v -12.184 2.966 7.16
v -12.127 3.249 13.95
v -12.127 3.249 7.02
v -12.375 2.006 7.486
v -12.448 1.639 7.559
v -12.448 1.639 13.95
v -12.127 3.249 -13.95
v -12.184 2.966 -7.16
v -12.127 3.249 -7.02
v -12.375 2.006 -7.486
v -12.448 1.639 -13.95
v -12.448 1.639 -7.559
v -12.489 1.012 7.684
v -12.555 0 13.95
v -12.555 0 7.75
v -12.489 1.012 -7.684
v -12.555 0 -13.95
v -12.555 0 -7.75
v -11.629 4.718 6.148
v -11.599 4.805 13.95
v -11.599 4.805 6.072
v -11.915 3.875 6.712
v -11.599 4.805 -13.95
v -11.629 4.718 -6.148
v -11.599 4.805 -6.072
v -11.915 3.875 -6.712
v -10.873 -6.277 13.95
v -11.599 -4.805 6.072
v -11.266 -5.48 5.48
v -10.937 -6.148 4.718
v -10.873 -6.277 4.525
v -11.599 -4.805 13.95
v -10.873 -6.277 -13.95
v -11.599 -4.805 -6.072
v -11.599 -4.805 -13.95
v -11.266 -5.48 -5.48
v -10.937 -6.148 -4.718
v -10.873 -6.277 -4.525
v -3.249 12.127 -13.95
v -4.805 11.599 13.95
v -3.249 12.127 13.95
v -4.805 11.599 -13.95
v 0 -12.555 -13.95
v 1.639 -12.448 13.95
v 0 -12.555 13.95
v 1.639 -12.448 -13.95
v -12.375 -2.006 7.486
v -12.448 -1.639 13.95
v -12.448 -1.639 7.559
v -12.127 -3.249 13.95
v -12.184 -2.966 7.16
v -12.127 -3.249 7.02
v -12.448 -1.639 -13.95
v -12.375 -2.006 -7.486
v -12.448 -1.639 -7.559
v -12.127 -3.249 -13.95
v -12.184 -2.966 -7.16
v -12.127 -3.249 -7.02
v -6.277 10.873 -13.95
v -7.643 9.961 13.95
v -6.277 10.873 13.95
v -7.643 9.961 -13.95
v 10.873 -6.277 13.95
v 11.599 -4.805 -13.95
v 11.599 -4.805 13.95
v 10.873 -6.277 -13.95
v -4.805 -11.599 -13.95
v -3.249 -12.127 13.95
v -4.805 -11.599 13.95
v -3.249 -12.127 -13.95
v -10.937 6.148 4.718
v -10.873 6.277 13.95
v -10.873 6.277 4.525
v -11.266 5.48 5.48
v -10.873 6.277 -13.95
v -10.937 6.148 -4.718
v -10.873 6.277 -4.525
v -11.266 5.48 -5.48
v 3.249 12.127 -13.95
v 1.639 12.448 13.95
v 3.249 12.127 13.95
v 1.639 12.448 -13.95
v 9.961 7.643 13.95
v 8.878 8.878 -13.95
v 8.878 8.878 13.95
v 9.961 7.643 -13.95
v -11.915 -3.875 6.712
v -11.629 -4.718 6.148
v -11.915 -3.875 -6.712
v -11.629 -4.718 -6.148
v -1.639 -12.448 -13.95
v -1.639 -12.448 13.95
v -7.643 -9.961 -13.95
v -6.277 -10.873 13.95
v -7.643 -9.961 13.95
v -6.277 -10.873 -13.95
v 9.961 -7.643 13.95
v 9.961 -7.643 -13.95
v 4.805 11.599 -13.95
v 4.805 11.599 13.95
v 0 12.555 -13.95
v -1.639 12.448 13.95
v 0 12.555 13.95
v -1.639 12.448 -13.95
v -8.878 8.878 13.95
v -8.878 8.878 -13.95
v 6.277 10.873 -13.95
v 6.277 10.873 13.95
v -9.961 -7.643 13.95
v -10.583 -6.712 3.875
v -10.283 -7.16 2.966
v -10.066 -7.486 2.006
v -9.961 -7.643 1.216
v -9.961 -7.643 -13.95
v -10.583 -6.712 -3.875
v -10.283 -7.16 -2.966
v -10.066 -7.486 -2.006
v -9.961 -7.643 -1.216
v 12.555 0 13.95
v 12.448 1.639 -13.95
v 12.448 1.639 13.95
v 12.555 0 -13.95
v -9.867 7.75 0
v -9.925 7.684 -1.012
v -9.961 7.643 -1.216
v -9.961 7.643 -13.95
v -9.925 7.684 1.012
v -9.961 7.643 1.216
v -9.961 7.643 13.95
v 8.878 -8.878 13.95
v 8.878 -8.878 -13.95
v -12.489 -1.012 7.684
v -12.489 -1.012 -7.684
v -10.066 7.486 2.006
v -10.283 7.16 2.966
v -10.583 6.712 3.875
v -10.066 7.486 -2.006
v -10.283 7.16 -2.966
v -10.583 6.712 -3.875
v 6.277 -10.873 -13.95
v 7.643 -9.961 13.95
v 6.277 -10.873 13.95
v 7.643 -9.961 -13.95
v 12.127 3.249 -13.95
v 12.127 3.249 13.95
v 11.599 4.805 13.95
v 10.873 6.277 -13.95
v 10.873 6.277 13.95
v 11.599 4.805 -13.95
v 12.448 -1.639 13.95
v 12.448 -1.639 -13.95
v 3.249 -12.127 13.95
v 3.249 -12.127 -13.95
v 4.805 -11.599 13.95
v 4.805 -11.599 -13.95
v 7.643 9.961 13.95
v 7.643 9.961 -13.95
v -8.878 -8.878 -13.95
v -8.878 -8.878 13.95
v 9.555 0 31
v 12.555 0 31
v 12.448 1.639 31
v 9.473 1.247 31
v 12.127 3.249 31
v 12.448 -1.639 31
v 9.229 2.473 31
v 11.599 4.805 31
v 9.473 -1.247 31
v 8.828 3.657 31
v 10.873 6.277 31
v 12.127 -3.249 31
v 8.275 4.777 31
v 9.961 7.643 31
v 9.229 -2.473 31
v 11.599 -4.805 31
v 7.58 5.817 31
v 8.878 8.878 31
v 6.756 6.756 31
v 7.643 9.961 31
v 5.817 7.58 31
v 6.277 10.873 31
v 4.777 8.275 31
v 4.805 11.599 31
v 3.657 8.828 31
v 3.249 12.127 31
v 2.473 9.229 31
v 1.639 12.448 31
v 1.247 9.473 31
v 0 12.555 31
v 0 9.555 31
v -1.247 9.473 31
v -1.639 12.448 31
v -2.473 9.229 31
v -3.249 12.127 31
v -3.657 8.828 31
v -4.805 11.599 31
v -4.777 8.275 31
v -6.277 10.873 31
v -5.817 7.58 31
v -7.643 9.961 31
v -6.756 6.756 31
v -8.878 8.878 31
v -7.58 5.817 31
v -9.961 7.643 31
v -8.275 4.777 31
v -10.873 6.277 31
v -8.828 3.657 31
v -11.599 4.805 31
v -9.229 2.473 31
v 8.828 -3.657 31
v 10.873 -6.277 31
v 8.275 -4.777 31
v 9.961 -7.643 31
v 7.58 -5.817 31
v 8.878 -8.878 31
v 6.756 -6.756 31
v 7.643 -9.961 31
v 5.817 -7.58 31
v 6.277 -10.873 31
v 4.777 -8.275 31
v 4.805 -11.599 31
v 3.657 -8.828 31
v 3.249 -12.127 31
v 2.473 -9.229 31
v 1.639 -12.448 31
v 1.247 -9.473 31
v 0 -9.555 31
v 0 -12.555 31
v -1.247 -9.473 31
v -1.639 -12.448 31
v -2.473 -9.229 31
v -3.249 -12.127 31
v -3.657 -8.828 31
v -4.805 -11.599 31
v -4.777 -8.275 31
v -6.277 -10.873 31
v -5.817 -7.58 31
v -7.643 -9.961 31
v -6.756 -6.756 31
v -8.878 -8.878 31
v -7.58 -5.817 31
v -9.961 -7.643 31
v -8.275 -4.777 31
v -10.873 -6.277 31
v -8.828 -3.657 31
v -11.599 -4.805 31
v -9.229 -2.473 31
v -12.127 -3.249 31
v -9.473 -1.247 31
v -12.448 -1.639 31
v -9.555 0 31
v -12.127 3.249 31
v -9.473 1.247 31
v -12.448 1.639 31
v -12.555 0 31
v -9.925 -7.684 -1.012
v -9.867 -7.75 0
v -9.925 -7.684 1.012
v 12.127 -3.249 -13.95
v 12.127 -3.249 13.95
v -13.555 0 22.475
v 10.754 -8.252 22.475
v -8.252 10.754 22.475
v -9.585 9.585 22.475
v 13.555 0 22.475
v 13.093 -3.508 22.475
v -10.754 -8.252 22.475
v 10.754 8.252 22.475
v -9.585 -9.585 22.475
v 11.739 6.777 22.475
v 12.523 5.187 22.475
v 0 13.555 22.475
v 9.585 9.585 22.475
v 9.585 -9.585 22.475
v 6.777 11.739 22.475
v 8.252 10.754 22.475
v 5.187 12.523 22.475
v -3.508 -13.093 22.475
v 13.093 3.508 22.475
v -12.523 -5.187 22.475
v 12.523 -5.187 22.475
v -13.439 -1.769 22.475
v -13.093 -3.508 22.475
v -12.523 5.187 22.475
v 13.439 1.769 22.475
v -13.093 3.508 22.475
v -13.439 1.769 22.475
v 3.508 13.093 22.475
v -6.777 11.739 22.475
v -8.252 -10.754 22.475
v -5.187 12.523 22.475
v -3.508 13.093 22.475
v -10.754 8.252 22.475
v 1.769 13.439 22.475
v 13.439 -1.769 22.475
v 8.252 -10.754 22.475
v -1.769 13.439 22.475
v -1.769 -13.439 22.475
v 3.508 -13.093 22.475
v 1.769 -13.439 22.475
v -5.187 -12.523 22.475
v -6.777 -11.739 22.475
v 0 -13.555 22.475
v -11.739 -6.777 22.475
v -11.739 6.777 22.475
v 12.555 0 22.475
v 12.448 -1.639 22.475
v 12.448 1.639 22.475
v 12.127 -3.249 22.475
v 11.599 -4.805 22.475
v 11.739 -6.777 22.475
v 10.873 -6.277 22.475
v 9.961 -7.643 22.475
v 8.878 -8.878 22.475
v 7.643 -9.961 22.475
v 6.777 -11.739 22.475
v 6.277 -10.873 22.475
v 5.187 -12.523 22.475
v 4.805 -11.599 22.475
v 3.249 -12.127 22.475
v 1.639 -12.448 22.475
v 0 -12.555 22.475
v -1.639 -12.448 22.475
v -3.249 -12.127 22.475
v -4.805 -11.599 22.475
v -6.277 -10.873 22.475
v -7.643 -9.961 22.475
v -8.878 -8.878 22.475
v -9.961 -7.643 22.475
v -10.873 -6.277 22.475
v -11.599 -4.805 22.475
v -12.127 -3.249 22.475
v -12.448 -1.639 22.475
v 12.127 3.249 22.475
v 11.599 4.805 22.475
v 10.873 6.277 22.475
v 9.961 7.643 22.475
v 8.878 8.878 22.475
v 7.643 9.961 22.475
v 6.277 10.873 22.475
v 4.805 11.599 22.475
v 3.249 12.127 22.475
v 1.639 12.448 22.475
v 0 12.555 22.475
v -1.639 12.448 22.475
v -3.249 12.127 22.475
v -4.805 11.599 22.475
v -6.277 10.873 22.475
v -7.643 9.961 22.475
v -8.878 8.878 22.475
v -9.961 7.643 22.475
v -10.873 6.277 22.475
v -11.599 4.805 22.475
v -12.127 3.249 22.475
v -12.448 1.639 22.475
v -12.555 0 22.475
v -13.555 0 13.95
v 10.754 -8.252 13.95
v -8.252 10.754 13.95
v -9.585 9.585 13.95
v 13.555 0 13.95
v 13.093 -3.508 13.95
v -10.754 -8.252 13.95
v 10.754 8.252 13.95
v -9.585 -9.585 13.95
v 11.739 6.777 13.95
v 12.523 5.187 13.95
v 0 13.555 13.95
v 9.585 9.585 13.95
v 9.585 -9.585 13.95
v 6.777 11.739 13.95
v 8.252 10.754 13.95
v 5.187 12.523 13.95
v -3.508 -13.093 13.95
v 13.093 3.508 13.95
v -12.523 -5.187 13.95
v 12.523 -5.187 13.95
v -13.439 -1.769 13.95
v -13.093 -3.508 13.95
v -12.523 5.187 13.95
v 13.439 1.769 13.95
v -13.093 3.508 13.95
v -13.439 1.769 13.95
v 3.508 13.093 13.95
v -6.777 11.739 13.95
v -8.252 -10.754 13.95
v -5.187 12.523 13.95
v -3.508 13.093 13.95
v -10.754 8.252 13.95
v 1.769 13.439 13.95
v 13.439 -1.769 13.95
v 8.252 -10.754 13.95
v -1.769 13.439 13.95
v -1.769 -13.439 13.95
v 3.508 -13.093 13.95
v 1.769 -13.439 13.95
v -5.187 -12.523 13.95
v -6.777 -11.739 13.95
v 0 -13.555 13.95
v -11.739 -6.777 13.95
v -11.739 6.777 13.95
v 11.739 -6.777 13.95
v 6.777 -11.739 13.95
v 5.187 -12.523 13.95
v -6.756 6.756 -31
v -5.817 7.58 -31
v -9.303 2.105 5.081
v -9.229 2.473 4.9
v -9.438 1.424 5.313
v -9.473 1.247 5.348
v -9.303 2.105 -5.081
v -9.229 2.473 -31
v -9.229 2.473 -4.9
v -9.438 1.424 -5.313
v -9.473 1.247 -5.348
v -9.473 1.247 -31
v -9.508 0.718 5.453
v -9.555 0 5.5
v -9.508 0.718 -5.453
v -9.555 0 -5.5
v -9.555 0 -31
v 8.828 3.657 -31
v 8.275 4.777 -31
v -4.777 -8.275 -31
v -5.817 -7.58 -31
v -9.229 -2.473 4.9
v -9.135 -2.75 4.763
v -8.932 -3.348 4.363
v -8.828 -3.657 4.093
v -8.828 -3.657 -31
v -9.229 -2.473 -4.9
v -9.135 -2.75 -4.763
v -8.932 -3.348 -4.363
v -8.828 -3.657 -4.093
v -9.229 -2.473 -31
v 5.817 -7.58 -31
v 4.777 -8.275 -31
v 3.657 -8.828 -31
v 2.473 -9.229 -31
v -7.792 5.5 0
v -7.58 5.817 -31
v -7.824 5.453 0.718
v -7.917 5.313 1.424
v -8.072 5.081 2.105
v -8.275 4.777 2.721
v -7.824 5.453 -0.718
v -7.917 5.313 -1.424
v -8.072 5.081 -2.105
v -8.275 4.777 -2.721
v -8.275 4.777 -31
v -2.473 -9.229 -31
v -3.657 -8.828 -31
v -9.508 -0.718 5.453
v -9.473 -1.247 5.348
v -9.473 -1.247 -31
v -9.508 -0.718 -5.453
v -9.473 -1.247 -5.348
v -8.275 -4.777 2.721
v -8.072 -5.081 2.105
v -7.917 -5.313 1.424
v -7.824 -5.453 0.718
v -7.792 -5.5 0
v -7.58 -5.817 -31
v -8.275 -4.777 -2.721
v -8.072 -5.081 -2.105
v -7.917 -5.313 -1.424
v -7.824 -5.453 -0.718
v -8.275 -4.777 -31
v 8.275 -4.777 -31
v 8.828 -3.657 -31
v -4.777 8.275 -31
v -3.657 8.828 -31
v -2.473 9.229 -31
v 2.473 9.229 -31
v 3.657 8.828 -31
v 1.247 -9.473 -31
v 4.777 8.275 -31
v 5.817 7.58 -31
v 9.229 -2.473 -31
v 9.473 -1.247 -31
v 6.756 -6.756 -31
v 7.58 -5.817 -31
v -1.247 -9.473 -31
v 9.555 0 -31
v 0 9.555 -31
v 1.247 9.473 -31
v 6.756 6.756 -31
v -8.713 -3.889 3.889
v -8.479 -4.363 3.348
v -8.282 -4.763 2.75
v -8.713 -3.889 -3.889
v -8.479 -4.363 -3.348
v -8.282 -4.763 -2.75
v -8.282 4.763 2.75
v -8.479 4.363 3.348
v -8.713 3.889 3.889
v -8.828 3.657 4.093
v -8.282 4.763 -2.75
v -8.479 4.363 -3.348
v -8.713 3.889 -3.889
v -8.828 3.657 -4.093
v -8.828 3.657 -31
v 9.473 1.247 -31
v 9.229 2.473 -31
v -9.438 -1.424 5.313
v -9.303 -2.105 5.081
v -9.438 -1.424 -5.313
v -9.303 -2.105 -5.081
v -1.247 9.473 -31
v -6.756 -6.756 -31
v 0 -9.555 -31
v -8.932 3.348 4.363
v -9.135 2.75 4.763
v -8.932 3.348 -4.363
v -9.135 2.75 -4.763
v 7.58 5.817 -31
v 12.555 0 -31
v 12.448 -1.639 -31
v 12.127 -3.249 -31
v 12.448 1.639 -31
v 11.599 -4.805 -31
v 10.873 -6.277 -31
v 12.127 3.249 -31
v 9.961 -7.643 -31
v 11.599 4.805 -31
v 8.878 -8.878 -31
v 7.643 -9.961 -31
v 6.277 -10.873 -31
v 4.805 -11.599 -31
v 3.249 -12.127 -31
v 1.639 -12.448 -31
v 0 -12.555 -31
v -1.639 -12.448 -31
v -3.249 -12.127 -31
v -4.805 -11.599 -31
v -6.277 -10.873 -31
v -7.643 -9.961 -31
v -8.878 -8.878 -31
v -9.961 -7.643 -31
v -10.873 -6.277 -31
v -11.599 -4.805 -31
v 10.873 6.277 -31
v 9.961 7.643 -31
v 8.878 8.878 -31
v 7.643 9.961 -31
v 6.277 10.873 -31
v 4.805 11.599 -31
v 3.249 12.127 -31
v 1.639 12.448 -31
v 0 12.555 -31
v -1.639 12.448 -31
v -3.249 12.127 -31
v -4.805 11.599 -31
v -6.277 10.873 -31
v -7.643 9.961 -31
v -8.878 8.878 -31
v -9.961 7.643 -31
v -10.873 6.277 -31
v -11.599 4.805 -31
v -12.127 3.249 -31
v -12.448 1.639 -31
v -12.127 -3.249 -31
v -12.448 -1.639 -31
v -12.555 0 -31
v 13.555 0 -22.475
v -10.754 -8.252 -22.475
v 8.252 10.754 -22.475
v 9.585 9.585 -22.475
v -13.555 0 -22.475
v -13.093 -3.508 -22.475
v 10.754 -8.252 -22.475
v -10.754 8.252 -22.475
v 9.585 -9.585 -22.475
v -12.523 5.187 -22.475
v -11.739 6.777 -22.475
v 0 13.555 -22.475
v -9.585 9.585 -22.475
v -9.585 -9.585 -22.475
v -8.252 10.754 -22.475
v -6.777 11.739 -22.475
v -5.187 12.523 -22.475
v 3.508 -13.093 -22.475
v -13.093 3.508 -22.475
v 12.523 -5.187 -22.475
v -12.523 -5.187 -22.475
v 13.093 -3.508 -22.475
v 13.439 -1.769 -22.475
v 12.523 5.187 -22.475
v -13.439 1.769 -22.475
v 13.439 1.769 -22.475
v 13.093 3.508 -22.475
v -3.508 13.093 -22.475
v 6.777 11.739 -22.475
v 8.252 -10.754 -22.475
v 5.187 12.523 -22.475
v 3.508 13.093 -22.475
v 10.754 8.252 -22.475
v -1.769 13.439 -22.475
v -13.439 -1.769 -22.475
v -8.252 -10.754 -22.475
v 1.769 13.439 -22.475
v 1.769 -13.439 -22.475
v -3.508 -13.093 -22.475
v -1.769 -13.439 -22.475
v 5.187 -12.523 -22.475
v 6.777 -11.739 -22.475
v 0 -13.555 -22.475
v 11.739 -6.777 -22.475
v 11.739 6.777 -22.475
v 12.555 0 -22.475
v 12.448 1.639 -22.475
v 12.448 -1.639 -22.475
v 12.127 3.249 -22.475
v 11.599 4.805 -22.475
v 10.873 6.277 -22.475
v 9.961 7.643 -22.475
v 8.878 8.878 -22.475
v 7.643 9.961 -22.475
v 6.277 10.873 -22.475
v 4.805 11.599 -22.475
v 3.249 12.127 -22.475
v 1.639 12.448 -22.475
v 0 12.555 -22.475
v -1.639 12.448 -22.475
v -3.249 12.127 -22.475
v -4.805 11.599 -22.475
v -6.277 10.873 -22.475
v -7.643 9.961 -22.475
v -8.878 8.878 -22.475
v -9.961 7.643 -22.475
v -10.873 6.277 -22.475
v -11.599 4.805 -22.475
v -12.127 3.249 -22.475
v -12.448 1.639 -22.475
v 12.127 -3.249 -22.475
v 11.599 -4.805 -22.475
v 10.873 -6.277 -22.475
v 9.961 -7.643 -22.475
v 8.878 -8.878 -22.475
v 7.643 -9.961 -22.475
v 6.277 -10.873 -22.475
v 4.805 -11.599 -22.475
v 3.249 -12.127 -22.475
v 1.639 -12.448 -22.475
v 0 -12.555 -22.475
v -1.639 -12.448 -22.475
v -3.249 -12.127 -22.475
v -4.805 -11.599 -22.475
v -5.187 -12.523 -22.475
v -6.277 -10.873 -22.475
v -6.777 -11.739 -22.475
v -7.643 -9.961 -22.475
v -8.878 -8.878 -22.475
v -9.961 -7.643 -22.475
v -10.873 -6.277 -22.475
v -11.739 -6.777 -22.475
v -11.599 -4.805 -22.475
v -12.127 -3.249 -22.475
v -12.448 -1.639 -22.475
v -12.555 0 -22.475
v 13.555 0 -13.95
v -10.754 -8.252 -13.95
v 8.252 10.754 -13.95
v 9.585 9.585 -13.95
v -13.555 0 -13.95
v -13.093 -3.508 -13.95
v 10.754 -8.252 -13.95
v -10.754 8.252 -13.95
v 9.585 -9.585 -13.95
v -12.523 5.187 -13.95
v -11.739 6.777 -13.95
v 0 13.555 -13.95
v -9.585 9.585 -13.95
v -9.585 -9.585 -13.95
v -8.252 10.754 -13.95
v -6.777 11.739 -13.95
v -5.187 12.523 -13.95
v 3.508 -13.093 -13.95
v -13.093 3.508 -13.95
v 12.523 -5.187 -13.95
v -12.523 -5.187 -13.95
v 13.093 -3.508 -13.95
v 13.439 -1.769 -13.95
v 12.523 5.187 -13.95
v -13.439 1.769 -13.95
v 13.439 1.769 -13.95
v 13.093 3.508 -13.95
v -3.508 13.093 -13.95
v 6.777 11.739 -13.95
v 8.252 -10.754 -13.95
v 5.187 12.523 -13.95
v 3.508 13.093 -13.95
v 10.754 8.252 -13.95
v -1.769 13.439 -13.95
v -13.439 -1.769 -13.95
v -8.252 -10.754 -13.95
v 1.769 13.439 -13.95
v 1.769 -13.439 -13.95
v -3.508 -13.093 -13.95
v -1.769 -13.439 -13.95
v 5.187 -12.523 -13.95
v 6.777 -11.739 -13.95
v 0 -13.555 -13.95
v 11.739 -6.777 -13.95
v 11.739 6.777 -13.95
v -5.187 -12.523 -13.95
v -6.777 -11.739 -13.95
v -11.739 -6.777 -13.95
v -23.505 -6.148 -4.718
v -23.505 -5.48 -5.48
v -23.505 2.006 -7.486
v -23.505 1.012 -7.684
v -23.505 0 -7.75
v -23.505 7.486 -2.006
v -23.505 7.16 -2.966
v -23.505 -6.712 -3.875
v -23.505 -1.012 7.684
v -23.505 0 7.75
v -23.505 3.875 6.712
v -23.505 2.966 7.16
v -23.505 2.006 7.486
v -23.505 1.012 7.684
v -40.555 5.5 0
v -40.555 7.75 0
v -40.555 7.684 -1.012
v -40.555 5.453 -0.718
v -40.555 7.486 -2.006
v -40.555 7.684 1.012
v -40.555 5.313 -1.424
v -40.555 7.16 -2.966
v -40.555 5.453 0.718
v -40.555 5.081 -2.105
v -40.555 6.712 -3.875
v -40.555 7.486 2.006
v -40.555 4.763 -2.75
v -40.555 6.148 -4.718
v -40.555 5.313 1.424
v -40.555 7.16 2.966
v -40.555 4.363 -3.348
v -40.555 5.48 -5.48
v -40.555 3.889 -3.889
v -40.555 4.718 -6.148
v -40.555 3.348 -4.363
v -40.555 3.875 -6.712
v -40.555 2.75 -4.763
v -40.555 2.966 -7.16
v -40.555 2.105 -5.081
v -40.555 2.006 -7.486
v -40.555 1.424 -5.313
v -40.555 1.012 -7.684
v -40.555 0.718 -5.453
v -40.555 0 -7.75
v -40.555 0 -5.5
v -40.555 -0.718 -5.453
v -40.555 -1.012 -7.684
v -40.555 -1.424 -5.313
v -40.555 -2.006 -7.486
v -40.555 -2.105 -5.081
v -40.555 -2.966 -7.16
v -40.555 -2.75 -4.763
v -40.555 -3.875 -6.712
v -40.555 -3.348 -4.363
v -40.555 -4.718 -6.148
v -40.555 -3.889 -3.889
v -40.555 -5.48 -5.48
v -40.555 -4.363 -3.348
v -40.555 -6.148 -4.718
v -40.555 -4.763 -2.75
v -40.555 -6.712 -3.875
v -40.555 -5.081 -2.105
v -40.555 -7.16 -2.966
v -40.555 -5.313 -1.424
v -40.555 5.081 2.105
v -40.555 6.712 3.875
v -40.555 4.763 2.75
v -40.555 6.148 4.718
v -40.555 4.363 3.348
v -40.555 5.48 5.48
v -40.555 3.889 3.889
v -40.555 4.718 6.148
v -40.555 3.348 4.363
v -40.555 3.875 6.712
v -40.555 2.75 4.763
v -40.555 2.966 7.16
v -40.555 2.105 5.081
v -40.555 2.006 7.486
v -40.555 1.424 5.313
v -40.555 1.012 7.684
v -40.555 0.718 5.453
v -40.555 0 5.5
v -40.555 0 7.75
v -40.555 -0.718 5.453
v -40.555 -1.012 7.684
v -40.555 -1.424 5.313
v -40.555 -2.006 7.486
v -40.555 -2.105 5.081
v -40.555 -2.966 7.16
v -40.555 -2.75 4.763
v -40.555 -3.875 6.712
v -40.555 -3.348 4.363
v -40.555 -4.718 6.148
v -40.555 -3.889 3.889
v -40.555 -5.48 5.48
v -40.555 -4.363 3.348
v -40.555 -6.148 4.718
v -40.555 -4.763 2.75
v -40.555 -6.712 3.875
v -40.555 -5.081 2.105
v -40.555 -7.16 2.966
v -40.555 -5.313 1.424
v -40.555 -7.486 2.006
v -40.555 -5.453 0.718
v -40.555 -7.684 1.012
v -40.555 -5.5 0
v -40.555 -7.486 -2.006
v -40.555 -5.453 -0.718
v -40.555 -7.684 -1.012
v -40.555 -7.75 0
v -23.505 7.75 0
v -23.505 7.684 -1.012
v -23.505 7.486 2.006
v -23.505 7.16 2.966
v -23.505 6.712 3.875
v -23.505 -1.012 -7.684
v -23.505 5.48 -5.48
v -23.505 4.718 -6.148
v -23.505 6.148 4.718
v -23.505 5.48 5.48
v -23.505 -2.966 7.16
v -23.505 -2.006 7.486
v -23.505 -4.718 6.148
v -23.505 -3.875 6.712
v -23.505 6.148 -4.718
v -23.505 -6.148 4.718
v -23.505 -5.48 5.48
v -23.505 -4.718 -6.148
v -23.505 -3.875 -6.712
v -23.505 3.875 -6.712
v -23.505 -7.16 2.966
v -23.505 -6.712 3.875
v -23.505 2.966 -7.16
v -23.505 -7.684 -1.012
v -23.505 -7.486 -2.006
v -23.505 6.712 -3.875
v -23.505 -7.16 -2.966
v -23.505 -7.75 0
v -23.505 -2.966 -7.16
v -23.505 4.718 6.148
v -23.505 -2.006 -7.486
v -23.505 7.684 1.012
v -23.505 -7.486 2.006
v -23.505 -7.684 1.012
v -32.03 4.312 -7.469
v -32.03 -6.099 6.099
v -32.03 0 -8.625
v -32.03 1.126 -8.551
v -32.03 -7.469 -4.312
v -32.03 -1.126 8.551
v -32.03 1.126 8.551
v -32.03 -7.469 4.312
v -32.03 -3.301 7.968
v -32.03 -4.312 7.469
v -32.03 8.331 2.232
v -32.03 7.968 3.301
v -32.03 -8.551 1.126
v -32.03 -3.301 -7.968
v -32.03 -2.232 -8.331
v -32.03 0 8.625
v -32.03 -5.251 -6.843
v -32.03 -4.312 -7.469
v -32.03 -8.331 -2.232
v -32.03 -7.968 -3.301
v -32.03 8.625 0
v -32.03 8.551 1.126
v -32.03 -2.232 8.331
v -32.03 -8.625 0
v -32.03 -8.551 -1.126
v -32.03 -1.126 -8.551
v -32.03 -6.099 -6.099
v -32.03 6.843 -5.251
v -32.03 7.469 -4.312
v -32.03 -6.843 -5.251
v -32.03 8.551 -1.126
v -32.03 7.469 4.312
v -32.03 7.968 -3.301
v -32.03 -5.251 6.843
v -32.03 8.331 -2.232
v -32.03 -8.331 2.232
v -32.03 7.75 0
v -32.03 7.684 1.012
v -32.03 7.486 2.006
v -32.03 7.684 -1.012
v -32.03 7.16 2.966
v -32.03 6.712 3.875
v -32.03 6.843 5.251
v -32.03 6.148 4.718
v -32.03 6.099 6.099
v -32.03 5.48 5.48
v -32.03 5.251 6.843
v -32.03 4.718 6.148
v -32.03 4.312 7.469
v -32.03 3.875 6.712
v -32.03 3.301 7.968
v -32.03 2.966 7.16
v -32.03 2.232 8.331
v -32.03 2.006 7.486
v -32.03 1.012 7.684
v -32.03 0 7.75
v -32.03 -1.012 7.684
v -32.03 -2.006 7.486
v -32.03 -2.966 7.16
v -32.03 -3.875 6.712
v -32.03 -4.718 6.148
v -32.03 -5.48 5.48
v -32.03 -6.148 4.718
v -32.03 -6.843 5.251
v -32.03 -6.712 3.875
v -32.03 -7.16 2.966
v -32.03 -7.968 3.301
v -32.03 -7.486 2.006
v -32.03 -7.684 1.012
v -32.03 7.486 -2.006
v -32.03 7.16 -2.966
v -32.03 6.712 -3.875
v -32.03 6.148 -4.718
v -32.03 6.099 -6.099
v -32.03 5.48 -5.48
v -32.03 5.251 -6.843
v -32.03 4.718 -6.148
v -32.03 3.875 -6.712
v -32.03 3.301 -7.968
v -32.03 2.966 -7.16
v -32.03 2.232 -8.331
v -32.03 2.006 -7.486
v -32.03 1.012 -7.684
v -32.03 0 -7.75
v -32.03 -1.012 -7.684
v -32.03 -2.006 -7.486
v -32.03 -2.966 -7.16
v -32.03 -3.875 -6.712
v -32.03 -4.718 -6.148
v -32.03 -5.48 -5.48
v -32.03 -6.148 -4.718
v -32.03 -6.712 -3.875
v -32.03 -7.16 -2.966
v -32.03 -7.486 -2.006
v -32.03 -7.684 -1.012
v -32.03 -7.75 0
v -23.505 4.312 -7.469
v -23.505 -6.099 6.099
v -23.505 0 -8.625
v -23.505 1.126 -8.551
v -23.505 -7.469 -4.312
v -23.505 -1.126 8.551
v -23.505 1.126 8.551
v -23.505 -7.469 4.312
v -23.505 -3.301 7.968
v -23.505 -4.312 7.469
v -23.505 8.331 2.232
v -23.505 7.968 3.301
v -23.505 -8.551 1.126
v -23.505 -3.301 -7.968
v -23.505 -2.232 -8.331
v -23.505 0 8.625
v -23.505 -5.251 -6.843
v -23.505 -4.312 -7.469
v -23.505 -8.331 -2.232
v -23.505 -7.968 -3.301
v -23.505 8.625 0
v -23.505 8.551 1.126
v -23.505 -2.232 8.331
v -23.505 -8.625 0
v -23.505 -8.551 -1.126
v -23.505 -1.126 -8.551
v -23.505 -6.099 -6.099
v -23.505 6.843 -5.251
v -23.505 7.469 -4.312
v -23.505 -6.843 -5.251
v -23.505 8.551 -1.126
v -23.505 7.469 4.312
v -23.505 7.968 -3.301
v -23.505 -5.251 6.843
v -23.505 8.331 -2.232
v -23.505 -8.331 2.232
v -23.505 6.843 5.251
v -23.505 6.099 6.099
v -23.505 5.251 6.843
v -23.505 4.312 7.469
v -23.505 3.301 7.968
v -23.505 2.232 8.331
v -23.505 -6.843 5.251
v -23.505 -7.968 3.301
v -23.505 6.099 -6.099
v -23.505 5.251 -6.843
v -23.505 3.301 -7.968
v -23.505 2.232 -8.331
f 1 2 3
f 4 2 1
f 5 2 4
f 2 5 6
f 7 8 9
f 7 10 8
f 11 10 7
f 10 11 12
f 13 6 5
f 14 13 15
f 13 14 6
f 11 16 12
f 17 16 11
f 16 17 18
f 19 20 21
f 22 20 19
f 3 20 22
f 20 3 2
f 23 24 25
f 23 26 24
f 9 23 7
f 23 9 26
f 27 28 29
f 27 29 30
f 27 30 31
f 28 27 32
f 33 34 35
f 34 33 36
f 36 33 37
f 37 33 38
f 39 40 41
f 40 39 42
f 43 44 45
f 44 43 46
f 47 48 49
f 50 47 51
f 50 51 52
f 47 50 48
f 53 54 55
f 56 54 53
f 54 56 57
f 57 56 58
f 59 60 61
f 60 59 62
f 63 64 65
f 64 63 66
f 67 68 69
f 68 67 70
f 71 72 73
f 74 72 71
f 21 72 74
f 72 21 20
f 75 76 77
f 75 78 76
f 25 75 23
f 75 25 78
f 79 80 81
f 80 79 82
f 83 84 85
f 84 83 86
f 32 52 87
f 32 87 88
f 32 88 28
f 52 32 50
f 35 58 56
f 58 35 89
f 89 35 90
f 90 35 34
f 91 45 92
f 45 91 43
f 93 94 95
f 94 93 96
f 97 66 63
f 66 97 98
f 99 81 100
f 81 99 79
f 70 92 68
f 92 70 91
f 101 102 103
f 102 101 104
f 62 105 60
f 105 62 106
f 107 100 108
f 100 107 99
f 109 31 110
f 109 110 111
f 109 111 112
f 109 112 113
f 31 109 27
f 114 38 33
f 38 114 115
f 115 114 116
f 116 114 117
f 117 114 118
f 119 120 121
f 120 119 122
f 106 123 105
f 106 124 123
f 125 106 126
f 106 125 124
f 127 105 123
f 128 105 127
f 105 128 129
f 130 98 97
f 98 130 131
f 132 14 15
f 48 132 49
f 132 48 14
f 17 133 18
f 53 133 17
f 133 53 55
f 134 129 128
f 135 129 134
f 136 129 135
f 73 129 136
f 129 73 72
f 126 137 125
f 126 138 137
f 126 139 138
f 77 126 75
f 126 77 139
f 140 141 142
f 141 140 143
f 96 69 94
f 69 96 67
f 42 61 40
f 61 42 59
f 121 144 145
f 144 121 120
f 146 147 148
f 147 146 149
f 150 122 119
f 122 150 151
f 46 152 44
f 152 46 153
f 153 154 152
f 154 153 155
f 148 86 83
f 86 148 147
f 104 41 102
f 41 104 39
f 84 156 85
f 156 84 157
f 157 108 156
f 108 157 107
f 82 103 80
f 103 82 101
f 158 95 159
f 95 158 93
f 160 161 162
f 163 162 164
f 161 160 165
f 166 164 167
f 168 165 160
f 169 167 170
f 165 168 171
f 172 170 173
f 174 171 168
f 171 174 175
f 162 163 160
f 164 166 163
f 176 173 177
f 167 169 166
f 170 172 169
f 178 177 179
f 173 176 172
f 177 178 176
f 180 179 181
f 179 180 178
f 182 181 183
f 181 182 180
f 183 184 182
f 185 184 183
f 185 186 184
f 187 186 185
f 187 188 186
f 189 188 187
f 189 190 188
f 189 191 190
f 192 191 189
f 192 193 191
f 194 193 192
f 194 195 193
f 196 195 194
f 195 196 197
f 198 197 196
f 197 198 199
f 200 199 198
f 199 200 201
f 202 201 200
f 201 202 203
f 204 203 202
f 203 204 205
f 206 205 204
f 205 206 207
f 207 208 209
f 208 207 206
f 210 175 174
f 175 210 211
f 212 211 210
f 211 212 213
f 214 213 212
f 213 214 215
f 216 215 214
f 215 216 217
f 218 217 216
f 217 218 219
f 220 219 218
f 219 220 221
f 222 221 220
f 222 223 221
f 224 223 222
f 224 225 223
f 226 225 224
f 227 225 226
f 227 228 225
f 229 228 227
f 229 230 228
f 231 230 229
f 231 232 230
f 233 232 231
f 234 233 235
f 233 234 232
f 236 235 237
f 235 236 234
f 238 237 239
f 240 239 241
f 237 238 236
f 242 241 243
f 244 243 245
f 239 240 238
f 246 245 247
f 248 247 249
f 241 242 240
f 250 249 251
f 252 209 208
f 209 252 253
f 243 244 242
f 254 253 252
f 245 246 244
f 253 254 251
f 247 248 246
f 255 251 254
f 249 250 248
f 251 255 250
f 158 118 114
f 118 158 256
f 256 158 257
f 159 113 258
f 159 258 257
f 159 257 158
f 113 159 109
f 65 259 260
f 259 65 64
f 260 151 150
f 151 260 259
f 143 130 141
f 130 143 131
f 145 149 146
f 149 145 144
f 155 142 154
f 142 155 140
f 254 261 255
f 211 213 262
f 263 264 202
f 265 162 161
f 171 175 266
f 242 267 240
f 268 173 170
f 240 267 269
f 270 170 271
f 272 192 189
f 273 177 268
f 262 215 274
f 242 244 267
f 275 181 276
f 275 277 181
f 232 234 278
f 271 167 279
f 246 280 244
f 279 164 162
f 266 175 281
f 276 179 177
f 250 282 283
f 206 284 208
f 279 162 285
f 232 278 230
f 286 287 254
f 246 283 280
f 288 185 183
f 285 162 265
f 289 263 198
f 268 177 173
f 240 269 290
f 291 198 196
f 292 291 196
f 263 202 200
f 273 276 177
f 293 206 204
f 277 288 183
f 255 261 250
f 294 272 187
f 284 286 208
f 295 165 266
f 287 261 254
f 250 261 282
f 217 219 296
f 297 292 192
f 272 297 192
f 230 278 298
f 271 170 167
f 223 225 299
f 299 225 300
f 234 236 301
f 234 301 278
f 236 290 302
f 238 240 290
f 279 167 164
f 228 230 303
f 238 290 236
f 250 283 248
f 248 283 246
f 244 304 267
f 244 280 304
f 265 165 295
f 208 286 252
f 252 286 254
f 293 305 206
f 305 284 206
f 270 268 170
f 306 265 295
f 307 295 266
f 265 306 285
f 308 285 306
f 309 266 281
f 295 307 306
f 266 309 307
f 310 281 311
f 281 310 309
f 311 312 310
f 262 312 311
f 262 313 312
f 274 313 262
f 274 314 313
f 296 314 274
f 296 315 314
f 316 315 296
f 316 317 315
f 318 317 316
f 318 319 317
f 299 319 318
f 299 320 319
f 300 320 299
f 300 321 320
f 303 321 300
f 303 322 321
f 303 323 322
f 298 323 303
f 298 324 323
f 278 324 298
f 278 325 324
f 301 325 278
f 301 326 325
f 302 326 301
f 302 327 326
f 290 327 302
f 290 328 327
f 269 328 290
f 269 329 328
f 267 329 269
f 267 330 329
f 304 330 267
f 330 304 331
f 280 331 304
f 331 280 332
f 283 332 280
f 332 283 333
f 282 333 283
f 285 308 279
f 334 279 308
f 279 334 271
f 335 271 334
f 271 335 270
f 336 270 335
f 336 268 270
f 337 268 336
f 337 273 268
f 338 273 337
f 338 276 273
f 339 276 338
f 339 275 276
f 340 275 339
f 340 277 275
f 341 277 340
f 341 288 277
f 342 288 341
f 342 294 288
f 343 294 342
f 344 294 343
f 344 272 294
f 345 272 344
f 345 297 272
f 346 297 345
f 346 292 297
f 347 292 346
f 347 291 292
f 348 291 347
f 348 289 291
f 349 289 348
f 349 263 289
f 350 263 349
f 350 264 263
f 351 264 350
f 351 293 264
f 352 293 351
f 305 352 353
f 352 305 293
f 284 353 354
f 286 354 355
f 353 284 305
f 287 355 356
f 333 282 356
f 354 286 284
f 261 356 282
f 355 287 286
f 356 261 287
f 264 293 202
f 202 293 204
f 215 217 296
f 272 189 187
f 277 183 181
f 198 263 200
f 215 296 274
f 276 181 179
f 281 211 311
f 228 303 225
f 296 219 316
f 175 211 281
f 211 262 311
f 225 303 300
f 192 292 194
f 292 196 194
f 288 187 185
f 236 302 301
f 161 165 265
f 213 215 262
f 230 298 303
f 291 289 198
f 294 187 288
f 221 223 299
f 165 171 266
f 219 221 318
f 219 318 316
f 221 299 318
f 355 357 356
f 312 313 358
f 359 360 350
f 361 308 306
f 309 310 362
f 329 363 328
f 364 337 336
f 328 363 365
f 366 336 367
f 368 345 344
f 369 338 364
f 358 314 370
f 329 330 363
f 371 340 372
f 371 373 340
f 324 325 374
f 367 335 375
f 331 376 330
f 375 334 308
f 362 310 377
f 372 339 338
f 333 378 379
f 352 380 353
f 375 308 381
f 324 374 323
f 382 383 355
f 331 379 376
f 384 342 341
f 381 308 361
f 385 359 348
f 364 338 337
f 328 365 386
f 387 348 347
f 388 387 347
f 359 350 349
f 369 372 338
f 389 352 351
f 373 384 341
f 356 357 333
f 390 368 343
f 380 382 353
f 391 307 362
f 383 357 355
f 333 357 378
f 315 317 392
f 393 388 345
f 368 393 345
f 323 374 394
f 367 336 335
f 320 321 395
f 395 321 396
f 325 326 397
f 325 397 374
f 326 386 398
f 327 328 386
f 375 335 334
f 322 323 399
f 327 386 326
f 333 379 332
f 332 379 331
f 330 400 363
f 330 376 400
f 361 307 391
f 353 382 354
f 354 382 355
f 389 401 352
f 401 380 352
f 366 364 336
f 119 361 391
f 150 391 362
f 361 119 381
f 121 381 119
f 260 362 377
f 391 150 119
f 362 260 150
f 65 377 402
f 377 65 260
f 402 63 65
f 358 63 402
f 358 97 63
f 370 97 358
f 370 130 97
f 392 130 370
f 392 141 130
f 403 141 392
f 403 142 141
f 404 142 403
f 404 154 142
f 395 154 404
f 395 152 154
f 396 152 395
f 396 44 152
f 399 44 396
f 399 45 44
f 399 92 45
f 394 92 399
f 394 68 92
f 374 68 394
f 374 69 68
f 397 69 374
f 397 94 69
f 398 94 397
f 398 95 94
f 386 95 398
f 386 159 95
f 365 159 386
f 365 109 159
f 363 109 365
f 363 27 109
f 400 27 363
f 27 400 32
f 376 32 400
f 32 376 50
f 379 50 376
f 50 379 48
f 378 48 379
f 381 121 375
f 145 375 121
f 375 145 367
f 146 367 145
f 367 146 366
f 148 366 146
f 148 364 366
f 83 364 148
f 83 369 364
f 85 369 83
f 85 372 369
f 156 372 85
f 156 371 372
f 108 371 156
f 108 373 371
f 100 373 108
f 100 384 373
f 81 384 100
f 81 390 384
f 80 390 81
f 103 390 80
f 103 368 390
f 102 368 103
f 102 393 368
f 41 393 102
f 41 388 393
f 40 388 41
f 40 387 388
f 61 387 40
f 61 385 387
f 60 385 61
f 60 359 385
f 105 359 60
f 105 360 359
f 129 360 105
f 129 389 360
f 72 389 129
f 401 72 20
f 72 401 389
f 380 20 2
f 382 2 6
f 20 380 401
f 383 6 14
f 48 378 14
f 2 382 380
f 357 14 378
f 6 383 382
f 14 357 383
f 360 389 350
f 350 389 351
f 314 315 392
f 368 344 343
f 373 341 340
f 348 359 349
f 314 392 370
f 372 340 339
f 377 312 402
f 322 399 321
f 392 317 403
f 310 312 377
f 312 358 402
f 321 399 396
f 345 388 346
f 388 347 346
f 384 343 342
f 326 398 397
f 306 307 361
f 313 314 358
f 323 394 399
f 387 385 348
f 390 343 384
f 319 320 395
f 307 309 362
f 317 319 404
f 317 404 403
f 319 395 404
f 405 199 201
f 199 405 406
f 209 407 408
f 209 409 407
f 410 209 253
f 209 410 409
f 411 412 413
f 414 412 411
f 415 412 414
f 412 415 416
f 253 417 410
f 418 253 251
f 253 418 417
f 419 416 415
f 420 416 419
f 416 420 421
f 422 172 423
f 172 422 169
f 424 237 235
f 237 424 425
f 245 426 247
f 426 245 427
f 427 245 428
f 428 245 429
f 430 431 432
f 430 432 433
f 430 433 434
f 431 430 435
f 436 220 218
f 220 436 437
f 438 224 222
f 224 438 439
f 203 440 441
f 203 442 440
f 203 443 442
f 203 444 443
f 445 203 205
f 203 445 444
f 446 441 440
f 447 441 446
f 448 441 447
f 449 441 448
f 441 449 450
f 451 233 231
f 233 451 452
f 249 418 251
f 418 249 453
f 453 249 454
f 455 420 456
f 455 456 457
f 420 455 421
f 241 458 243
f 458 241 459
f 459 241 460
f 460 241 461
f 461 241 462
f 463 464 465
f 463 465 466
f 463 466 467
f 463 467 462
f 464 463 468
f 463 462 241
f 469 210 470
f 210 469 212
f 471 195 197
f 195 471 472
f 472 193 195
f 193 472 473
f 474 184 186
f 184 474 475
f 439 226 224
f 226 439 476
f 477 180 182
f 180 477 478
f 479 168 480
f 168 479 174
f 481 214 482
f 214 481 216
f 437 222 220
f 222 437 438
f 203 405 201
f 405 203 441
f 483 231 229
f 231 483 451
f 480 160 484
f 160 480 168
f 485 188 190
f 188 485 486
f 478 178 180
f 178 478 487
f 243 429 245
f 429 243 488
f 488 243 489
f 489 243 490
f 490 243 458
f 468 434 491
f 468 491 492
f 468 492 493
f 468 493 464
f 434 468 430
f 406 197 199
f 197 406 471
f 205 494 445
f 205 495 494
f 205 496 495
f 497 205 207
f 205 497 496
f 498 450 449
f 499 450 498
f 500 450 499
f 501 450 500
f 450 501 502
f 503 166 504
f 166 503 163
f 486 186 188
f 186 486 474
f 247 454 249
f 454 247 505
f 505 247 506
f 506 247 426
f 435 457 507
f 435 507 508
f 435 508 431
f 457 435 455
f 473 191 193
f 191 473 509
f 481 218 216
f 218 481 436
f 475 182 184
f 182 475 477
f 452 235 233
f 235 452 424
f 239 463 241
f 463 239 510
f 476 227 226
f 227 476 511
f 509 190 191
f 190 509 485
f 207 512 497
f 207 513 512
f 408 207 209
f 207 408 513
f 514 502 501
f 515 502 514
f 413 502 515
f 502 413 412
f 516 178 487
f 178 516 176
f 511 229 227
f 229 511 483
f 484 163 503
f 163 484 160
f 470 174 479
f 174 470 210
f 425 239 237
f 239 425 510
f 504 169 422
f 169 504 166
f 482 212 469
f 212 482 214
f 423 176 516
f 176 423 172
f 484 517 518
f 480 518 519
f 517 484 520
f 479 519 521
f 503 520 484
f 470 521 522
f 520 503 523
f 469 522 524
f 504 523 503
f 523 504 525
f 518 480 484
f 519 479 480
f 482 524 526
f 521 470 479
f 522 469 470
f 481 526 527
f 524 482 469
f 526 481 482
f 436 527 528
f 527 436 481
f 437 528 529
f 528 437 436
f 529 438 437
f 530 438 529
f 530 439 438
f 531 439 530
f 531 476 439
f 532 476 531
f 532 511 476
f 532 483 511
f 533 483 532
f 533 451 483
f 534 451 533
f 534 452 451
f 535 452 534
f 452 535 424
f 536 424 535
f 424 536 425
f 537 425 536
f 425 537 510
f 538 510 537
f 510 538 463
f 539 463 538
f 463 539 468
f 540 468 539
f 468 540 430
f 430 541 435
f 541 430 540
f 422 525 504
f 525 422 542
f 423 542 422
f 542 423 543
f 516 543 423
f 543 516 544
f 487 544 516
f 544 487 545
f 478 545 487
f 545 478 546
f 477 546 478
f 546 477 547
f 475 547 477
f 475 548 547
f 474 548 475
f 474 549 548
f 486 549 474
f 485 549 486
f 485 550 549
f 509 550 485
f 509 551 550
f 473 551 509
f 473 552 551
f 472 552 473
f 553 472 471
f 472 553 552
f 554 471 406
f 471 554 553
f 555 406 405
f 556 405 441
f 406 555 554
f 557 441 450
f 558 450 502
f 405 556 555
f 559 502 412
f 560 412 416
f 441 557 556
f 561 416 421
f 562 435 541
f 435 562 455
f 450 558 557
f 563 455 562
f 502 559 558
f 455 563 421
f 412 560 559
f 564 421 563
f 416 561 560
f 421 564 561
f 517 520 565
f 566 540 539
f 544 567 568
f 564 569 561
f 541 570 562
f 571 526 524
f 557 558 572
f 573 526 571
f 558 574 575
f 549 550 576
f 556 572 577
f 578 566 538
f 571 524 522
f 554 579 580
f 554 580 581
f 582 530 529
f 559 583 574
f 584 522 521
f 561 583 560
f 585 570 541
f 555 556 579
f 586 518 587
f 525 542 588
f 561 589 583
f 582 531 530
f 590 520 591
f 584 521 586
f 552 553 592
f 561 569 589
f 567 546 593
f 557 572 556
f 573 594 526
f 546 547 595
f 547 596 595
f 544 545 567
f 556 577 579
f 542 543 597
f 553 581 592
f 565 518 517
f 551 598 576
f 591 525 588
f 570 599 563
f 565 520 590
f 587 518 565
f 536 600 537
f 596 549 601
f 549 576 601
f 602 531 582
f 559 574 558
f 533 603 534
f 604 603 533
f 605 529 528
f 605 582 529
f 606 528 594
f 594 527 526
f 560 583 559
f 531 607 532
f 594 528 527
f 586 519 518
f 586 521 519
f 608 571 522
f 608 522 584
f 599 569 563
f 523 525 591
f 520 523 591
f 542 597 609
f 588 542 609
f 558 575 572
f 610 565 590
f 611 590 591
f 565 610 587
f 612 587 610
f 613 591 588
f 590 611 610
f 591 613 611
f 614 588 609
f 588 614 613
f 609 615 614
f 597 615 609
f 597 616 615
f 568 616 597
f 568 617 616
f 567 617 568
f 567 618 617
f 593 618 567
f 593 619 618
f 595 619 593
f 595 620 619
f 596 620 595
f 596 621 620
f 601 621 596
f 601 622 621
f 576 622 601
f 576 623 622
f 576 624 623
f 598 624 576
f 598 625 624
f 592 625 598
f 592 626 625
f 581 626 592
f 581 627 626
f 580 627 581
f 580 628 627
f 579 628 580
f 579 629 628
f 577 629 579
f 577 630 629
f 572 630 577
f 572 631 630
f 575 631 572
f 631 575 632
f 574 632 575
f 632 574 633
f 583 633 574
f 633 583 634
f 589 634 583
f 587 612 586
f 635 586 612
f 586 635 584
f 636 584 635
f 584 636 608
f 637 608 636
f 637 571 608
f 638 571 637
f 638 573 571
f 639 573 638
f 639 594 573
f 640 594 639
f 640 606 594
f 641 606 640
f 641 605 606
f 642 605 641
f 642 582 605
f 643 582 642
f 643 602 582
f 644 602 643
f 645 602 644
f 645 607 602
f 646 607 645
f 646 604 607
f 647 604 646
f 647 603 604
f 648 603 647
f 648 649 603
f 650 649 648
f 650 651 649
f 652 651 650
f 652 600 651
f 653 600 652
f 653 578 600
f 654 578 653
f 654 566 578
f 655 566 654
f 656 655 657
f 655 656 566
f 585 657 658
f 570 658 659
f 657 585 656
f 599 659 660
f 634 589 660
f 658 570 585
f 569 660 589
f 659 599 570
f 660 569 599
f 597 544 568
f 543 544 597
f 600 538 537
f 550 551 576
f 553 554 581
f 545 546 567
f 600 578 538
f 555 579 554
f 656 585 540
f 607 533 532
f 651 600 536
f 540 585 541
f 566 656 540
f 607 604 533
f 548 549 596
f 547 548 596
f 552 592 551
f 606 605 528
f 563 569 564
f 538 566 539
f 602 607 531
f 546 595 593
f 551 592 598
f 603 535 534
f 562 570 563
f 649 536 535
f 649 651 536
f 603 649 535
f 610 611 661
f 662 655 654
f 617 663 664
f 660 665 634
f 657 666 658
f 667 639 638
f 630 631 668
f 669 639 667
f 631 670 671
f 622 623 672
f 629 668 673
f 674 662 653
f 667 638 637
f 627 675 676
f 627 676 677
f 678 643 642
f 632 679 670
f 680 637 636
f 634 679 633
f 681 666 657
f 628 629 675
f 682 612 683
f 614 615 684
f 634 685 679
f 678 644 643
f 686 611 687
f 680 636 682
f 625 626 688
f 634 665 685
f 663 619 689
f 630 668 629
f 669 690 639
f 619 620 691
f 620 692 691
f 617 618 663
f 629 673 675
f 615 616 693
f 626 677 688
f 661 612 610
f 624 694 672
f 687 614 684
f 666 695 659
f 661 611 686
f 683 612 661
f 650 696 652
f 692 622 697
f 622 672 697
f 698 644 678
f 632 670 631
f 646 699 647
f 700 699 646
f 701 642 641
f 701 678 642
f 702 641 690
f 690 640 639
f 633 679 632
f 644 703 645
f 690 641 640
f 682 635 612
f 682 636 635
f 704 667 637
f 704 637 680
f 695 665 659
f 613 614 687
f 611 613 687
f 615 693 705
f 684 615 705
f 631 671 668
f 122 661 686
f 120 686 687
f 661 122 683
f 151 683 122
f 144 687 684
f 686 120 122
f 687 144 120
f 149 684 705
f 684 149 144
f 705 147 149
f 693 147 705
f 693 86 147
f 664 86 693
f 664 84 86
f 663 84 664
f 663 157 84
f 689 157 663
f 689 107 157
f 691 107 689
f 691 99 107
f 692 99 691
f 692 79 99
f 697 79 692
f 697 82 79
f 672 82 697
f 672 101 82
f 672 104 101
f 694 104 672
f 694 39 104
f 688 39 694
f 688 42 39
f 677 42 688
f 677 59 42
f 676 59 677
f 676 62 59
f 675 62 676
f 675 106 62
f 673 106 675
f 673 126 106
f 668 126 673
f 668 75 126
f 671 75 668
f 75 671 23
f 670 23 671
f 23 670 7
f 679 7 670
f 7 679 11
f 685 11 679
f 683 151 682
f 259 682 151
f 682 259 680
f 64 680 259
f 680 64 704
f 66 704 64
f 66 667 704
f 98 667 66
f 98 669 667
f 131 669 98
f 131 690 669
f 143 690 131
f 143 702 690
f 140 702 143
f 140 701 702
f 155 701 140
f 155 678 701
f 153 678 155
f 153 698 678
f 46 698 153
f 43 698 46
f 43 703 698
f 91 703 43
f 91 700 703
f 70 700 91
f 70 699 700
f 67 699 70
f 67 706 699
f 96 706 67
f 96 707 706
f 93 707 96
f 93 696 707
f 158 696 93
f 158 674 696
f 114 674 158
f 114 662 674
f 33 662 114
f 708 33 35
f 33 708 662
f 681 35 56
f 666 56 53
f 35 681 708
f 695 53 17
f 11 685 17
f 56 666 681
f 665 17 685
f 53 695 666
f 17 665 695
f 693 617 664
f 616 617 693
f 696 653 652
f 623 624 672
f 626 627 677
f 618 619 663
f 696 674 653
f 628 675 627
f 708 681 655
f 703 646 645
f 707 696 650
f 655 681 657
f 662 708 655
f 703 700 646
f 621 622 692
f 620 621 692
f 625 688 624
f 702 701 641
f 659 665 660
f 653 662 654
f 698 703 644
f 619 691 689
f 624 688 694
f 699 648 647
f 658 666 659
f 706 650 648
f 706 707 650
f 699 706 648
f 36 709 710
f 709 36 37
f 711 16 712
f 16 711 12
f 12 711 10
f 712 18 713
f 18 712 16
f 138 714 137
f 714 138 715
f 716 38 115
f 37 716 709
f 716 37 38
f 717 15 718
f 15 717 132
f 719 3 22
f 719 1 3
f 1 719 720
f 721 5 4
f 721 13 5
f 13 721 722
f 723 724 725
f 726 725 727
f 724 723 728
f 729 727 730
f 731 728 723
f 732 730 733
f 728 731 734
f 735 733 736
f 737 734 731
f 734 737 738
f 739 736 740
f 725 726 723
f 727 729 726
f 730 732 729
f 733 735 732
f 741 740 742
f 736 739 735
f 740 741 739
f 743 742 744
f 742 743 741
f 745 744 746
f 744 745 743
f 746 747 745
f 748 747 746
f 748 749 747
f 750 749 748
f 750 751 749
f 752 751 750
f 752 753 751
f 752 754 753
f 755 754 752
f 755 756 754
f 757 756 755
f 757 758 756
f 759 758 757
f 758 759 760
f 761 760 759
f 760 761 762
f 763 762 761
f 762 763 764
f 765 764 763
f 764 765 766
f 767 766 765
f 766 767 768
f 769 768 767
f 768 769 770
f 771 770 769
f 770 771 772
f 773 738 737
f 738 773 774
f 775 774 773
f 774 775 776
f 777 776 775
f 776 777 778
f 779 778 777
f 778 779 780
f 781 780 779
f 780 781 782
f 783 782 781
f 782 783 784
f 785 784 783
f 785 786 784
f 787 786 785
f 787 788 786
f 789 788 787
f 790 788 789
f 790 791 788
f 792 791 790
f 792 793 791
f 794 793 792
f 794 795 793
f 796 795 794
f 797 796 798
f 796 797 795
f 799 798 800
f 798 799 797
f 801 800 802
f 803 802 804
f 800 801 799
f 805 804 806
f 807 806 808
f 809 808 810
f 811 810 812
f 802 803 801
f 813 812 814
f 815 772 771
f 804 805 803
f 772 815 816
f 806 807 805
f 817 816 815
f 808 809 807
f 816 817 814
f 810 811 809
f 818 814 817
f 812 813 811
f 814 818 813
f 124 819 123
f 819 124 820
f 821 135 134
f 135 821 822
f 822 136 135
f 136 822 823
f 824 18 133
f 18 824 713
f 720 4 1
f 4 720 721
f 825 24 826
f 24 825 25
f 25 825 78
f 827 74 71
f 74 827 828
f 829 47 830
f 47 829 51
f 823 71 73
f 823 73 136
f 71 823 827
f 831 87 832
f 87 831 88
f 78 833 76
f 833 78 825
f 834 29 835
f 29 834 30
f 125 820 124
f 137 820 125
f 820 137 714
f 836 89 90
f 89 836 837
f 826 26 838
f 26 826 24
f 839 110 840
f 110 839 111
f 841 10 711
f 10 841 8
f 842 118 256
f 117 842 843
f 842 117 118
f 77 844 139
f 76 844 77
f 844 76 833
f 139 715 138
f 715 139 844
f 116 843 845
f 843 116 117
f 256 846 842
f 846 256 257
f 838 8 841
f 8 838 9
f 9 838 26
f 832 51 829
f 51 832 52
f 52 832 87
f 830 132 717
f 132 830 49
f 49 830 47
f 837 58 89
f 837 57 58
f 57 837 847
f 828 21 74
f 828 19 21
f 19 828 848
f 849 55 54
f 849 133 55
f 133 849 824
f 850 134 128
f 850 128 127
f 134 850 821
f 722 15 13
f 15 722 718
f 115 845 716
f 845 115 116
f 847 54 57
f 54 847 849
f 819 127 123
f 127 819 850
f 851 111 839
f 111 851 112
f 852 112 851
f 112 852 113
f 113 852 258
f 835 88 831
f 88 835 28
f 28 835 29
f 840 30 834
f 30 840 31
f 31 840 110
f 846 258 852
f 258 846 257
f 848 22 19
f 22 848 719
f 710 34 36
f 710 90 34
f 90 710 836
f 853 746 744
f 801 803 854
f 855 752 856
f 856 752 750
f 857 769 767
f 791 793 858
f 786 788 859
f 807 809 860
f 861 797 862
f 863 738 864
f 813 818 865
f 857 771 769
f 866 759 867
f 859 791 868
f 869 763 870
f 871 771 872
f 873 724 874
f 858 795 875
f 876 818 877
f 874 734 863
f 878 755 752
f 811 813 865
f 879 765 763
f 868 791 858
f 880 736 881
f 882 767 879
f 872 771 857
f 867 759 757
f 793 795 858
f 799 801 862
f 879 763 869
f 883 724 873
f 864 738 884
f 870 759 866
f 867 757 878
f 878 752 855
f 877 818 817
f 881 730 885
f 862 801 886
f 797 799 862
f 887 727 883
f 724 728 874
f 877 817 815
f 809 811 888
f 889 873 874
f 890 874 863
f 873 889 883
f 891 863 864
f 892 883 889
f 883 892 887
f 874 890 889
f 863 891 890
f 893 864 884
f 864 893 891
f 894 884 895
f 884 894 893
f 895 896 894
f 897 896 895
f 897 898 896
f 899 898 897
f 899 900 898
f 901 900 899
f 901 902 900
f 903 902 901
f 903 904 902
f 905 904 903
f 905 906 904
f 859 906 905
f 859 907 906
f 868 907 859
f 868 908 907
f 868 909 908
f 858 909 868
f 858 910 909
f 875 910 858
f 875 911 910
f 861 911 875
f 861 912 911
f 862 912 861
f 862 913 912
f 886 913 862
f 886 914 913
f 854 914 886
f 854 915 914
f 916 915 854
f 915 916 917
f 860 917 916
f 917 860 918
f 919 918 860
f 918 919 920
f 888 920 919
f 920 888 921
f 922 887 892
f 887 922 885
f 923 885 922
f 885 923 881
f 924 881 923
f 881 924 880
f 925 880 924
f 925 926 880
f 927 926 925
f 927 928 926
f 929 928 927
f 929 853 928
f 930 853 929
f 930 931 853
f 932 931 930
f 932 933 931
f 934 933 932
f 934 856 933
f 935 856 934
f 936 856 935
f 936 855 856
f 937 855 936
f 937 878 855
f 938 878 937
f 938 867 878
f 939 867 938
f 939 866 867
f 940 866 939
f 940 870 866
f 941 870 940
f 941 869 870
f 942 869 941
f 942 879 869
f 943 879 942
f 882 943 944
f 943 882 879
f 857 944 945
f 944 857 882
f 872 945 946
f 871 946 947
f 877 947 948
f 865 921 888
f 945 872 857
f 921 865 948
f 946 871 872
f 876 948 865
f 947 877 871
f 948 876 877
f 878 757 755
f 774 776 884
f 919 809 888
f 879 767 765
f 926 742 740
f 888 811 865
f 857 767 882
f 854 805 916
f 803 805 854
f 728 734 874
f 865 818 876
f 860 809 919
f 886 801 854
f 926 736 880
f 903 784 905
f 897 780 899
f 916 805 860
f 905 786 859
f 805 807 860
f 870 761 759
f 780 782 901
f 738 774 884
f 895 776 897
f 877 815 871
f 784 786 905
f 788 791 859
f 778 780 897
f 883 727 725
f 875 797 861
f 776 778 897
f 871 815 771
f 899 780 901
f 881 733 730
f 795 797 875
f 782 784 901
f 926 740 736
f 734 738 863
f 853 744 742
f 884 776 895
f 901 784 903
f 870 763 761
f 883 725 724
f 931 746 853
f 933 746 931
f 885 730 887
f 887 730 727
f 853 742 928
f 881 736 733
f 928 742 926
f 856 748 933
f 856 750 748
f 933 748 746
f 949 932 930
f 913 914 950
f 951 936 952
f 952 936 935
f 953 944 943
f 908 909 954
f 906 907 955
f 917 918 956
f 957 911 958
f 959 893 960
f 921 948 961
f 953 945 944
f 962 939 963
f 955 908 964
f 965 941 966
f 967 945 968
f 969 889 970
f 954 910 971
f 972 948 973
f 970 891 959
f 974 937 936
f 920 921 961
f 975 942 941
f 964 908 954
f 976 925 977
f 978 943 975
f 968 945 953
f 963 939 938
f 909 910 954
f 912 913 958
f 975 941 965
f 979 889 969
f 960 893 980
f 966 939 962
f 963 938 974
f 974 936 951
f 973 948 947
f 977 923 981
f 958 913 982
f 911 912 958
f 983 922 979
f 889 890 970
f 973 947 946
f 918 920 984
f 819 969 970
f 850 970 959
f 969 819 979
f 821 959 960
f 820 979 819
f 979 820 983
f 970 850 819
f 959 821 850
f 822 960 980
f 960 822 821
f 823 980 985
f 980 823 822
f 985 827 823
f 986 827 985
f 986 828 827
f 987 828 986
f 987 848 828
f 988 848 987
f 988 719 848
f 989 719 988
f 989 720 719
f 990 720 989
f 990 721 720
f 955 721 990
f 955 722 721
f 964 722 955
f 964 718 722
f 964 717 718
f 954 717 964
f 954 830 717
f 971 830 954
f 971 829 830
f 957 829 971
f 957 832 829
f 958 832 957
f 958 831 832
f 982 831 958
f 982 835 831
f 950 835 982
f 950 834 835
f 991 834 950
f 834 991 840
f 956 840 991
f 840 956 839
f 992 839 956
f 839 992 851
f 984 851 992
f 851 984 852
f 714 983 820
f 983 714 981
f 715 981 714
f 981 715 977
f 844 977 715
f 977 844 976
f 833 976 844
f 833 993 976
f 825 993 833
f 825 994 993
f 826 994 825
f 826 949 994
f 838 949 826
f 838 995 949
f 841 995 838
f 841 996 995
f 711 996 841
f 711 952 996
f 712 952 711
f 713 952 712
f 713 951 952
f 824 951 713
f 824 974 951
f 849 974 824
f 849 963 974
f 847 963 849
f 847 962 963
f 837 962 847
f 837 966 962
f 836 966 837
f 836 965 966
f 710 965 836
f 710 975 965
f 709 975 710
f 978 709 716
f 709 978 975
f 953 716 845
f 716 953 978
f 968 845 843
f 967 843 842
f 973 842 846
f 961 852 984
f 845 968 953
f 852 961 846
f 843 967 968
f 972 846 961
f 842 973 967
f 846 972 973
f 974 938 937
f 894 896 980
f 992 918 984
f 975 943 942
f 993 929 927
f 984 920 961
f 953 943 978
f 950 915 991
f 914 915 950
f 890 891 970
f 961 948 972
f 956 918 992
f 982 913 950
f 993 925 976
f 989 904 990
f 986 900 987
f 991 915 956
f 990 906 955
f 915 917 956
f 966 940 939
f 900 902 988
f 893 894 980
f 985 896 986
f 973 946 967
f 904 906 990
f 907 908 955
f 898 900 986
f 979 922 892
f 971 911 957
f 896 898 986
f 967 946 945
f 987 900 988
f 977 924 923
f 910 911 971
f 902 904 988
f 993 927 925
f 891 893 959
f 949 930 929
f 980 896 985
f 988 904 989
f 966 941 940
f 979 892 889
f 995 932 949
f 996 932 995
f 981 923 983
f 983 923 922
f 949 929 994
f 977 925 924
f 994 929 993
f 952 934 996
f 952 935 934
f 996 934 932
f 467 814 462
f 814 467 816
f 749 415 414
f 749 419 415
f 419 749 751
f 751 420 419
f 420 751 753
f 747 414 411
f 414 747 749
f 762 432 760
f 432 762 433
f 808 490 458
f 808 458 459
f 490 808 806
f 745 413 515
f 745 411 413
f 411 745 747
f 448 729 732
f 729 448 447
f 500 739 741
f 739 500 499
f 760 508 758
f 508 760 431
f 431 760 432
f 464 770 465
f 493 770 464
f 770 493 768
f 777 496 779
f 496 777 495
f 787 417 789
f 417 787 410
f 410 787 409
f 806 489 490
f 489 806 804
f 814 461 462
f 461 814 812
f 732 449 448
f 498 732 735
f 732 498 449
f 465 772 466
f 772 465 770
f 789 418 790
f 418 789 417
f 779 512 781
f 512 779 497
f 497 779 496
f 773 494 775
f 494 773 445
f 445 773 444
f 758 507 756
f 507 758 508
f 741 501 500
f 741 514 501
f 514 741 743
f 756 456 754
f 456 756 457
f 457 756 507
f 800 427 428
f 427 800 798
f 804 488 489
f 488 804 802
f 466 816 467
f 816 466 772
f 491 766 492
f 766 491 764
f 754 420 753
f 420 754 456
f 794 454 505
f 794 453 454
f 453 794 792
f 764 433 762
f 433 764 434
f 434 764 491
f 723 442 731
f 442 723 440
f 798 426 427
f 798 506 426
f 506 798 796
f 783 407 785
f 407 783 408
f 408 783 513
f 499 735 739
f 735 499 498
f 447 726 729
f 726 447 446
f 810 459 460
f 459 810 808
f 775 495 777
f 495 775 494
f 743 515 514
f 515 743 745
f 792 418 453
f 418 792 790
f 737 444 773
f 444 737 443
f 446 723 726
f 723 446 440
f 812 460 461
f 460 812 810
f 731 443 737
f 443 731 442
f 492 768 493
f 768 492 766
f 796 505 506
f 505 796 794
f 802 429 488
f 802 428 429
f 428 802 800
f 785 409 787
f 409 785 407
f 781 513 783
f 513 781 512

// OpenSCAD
//Height of Tee
total_t_length=31*2;
//Diameter of main part of Tee
main_t_diameter=25.11;
//Height of barbs on Tee
main_t_barb_height=2;
//Wall thickness of main part of Tee
main_t_wall_thickness=3;

//Diameter of Tee portion of Tee
secondary_diameter=15.5;
//Height of barbs on Tee portion of Tee
secondary_barb_height=1.75;
//Wall thickness of Tee portion of Tee
secondary_wall_thickness=2.25;

difference() {
  union() {
    translate([0,0,total_t_length/2]){
      rotate(a=[0,180,0]){
        hose_barb(total_t_length/2, main_t_diameter, main_t_barb_height, main_t_wall_thickness);
      }
    }

    translate([0,0,-total_t_length/2]){
      rotate(a=[0,0,0]){
        hose_barb(total_t_length/2, main_t_diameter, main_t_barb_height, main_t_wall_thickness);
      }
    }
    translate([-(total_t_length/2 + main_t_diameter/2 - main_t_wall_thickness),0,0]){
      rotate(a=[0,90,0]){
        hose_barb(total_t_length/2, secondary_diameter, secondary_barb_height, secondary_wall_thickness);
      }
    }
  }
  rotate(a=[0,90,0]){
    translate([0,0,-total_t_length]){
      cylinder(h=total_t_length, d=secondary_diameter- (secondary_wall_thickness*2), $fn=48);
    }
  }
}



module hose_barb(height, diameter, barb_height, wall_thickness)
{ 
  end_barb_height = height - (height * 0.45);
  difference(){
    union(){
      cylinder(h=height,d=diameter,$fn=48);//pipe
      cylinder(h=end_barb_height/2,d1=diameter,d2=diameter+barb_height,$fn=48);//barb
      translate([0,0,end_barb_height/2]){
        cylinder(h=end_barb_height/2,d1=diameter,d2=diameter+barb_height,$fn=48);//barb
      }
    }
    cylinder(h=height,d=diameter - (wall_thickness*2),$fn=48);//hole
  }
}
